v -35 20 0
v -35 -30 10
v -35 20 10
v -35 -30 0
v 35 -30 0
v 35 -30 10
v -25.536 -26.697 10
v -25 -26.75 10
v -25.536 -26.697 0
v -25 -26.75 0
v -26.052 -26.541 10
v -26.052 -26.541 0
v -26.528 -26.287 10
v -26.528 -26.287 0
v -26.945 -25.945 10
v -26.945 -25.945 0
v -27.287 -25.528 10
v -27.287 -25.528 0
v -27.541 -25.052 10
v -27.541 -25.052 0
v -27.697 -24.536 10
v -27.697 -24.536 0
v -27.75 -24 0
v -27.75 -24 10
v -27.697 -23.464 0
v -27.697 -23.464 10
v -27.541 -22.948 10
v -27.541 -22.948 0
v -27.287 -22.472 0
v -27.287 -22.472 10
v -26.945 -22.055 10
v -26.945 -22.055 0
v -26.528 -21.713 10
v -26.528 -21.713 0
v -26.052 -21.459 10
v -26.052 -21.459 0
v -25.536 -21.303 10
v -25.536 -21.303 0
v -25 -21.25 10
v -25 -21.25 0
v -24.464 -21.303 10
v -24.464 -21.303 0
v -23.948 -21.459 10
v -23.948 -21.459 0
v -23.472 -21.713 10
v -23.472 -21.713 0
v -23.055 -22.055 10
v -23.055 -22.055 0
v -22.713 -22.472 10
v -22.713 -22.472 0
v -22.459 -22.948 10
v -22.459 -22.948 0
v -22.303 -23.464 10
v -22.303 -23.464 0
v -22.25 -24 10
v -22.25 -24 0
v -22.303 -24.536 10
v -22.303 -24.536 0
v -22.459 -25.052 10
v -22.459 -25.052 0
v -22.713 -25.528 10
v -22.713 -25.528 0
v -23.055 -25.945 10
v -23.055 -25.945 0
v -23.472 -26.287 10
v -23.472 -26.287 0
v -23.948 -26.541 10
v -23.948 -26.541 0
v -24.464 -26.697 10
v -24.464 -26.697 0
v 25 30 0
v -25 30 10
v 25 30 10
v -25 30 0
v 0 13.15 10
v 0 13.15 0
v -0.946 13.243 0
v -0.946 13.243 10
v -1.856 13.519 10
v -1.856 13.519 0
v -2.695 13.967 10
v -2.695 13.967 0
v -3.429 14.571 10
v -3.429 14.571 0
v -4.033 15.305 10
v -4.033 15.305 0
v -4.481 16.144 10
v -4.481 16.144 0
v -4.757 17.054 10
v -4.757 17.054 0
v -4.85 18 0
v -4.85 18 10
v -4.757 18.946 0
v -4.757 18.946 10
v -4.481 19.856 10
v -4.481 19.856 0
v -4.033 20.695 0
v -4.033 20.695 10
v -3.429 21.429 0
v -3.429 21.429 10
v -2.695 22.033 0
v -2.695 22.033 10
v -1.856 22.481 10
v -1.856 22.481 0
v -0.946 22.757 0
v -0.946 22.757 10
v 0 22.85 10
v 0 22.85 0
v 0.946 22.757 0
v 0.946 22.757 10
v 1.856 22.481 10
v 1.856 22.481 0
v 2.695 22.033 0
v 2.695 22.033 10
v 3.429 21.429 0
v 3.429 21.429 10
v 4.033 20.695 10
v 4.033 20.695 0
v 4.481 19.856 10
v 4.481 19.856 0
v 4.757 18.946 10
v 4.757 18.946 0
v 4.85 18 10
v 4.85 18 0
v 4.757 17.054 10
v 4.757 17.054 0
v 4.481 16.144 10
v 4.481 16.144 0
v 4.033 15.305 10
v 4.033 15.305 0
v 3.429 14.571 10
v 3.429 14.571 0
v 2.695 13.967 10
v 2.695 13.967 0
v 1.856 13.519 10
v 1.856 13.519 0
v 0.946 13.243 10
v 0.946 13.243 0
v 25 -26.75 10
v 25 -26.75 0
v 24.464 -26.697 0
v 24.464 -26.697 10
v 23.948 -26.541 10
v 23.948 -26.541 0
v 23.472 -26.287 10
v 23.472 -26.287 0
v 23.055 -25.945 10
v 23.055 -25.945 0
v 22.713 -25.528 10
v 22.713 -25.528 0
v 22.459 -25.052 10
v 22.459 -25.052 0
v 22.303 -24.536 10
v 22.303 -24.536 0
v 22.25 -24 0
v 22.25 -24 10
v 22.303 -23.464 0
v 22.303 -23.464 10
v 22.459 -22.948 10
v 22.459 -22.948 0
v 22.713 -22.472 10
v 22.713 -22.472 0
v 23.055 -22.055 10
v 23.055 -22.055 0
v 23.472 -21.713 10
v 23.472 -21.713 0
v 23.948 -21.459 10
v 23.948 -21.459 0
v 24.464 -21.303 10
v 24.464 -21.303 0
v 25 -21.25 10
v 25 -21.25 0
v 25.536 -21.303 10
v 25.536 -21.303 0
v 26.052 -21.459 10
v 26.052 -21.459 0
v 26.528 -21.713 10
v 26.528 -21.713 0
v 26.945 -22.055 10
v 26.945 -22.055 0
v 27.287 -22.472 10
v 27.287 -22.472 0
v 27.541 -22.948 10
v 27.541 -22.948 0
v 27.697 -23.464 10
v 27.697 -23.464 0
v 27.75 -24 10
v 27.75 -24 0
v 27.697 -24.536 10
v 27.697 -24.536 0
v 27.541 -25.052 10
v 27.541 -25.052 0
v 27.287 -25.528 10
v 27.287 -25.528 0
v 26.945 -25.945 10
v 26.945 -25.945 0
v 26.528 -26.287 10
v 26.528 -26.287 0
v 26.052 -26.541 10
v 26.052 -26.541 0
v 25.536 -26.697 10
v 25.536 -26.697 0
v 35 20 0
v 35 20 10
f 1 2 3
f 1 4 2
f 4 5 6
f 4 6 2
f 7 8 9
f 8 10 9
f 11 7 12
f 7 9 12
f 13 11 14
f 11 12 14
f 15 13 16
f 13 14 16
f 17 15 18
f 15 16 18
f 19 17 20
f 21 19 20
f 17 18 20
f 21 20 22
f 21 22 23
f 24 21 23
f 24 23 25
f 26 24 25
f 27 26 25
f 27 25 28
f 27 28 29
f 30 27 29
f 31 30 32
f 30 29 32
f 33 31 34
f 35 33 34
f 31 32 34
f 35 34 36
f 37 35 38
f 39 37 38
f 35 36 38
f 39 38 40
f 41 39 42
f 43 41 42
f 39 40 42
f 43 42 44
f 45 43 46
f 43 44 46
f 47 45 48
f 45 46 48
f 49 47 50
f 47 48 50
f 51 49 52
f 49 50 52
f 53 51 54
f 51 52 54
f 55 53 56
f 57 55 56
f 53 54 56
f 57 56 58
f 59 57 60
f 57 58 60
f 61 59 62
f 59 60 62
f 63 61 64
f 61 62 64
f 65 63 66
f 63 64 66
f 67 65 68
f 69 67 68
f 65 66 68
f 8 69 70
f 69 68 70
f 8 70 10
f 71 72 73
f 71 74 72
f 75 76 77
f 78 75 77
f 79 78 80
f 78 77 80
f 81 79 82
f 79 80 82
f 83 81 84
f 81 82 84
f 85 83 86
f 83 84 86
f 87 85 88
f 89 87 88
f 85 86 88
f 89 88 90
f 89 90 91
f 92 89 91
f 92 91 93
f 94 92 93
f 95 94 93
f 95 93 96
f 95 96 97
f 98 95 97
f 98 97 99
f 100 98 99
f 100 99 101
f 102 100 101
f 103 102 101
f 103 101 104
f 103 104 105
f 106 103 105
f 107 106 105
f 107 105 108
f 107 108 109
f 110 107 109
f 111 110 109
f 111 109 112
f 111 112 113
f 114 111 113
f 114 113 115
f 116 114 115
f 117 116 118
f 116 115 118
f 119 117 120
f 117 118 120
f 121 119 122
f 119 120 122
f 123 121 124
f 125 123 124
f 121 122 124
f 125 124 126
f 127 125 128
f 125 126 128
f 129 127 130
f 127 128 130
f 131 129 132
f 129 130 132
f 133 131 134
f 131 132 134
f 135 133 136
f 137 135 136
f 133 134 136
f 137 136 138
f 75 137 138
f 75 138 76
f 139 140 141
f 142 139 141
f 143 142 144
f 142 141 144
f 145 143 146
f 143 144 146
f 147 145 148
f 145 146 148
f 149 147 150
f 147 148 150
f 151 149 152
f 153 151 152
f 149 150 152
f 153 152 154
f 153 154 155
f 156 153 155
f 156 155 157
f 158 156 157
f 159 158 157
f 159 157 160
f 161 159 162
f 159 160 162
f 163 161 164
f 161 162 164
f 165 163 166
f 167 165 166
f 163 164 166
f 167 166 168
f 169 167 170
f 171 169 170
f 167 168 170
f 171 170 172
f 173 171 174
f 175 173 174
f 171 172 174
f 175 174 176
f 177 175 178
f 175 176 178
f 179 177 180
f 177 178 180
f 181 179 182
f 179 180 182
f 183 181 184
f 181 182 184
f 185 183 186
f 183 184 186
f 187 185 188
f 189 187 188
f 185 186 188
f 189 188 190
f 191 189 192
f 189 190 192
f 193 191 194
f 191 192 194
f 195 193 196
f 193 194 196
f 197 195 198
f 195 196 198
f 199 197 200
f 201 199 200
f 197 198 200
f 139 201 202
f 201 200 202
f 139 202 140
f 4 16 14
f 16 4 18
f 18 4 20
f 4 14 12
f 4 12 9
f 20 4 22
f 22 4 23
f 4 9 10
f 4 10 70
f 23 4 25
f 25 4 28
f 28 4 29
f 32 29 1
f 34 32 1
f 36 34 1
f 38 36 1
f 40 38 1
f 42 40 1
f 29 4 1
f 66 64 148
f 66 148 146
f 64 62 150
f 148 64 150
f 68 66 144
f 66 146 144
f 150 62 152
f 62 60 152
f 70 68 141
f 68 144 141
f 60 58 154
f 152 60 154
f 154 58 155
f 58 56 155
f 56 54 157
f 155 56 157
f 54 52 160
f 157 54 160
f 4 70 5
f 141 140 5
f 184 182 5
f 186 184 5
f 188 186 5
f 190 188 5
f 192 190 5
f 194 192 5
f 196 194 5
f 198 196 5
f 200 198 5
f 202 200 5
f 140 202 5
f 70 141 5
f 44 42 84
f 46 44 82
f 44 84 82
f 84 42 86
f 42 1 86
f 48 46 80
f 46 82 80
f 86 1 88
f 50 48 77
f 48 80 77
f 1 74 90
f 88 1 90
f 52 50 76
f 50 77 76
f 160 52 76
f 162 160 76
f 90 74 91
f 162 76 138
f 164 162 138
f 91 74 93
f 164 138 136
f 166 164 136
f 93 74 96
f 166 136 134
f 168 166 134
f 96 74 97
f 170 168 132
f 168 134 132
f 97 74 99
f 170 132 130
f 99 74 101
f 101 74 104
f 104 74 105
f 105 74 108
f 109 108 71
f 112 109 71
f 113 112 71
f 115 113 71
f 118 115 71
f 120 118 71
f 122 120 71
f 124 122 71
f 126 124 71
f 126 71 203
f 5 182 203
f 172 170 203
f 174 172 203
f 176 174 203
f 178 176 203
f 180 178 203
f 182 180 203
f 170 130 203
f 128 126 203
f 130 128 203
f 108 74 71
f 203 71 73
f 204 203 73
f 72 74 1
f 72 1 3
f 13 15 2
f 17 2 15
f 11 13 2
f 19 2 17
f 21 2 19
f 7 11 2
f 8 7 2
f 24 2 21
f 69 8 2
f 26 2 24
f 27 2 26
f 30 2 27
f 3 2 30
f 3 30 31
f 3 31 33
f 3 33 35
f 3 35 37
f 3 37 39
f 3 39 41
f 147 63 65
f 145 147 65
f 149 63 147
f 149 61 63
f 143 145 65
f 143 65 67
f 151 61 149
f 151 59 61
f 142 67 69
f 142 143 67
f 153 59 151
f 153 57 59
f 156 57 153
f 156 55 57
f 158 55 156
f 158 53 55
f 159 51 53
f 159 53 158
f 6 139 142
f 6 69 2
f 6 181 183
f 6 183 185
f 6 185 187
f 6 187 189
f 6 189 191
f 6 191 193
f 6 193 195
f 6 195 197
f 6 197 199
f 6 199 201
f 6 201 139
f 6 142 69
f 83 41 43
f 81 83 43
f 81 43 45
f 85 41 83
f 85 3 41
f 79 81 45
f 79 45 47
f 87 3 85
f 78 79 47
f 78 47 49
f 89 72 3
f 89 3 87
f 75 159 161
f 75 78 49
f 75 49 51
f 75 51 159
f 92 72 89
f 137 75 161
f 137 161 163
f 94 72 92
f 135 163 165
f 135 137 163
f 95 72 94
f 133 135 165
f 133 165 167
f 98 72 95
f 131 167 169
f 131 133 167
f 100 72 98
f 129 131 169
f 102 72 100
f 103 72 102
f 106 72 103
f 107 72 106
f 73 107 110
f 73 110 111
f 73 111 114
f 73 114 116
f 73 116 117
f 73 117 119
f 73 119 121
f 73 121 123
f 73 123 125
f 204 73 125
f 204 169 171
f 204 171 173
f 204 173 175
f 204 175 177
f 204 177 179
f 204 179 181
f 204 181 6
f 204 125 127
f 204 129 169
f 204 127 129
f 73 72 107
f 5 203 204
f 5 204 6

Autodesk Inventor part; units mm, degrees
ref_plane "YZ Plane" through (0, 0, 0) normal (1, 0, 0) x (0, 1, 0)
ref_plane "XZ Plane" through (0, 0, 0) normal (0, 1, 0) x (-1, 0, 0)
ref_plane "XY Plane" through (0, 0, 0) normal (0, 0, 1) x (1, 0, 0)
sketch "Skizze_Grundkörper" plane through (0, 0, 0) normal (0, 0, 1) x (1, 0, 0)
  line L0 (-56, 0) -> (56, 0) projected
  line L1 (0, -45.5) -> (0, 45.5) projected
  line L2 (35, -30) -> (-35, -30)
  line L3 (-35, -30) -> (-35, 30)
  line L4 (-35, 30) -> (35, 30)
  line L5 (35, 30) -> (35, -30)
  line L6 (35, -30) -> (-35, 30) construction
  line L7 (-35, -30) -> (35, 30) construction
  point P0 (0, 0)
  dimension "Länge" = 70
  dimension "Höhe" = 60
extrude "Grundkörper" add sketch "Skizze_Grundkörper" along normal blind 10
sketch "Skizze2" plane through (0, 0, 10) normal (0, 0, 1) x (1, 0, 0)
  line L0 (-35, -30) -> (35, -30) projected
  line L1 (35, -30) -> (35, 30) projected
  line L2 (35, 30) -> (-35, 30) projected
  line L3 (-35, 30) -> (-35, -30) projected
  line L4 (-56, 0) -> (56, 0) projected
  line L5 (0, -45.5) -> (0, 45.5) projected
  point P0 (0, 0)
  point P1 (0, 18)
  dimension "d4" = 48
hole "Bohrung_9,7_mm" at (0, 18, 10) direction (0, 0, -1) diameter 9.7 end through all
sketch "Skizze3" plane through (0, 0, 10) normal (0, 0, 1) x (1, 0, 0)
  circle A0 centre (0, 18) radius 4.85 projected
  line L0 (-35, -30) -> (35, -30) projected
  line L1 (35, -30) -> (35, 30) projected
  line L2 (35, 30) -> (-35, 30) projected
  line L3 (-35, 30) -> (-35, -30) projected
  line L4 (-56, 0) -> (56, 0) projected
  line L5 (0, -45.5) -> (0, 45.5) projected
  point P0 (0, 0)
  point P1 (-25, -24)
  point P2 (25, -24)
  dimension "d12" = 50
  dimension "d13" = 6
hole "Bohrung_5,5_mm" at (-25, -24, 10) at (25, -24, 10) direction (0, 0, -1) diameter 5.5 end through all
chamfer "Fase_10_mm" distance 10 angle 45 2 edges at (-35, 30, 5) (35, 30, 5)
properties material "Stahl, unlegiert"
